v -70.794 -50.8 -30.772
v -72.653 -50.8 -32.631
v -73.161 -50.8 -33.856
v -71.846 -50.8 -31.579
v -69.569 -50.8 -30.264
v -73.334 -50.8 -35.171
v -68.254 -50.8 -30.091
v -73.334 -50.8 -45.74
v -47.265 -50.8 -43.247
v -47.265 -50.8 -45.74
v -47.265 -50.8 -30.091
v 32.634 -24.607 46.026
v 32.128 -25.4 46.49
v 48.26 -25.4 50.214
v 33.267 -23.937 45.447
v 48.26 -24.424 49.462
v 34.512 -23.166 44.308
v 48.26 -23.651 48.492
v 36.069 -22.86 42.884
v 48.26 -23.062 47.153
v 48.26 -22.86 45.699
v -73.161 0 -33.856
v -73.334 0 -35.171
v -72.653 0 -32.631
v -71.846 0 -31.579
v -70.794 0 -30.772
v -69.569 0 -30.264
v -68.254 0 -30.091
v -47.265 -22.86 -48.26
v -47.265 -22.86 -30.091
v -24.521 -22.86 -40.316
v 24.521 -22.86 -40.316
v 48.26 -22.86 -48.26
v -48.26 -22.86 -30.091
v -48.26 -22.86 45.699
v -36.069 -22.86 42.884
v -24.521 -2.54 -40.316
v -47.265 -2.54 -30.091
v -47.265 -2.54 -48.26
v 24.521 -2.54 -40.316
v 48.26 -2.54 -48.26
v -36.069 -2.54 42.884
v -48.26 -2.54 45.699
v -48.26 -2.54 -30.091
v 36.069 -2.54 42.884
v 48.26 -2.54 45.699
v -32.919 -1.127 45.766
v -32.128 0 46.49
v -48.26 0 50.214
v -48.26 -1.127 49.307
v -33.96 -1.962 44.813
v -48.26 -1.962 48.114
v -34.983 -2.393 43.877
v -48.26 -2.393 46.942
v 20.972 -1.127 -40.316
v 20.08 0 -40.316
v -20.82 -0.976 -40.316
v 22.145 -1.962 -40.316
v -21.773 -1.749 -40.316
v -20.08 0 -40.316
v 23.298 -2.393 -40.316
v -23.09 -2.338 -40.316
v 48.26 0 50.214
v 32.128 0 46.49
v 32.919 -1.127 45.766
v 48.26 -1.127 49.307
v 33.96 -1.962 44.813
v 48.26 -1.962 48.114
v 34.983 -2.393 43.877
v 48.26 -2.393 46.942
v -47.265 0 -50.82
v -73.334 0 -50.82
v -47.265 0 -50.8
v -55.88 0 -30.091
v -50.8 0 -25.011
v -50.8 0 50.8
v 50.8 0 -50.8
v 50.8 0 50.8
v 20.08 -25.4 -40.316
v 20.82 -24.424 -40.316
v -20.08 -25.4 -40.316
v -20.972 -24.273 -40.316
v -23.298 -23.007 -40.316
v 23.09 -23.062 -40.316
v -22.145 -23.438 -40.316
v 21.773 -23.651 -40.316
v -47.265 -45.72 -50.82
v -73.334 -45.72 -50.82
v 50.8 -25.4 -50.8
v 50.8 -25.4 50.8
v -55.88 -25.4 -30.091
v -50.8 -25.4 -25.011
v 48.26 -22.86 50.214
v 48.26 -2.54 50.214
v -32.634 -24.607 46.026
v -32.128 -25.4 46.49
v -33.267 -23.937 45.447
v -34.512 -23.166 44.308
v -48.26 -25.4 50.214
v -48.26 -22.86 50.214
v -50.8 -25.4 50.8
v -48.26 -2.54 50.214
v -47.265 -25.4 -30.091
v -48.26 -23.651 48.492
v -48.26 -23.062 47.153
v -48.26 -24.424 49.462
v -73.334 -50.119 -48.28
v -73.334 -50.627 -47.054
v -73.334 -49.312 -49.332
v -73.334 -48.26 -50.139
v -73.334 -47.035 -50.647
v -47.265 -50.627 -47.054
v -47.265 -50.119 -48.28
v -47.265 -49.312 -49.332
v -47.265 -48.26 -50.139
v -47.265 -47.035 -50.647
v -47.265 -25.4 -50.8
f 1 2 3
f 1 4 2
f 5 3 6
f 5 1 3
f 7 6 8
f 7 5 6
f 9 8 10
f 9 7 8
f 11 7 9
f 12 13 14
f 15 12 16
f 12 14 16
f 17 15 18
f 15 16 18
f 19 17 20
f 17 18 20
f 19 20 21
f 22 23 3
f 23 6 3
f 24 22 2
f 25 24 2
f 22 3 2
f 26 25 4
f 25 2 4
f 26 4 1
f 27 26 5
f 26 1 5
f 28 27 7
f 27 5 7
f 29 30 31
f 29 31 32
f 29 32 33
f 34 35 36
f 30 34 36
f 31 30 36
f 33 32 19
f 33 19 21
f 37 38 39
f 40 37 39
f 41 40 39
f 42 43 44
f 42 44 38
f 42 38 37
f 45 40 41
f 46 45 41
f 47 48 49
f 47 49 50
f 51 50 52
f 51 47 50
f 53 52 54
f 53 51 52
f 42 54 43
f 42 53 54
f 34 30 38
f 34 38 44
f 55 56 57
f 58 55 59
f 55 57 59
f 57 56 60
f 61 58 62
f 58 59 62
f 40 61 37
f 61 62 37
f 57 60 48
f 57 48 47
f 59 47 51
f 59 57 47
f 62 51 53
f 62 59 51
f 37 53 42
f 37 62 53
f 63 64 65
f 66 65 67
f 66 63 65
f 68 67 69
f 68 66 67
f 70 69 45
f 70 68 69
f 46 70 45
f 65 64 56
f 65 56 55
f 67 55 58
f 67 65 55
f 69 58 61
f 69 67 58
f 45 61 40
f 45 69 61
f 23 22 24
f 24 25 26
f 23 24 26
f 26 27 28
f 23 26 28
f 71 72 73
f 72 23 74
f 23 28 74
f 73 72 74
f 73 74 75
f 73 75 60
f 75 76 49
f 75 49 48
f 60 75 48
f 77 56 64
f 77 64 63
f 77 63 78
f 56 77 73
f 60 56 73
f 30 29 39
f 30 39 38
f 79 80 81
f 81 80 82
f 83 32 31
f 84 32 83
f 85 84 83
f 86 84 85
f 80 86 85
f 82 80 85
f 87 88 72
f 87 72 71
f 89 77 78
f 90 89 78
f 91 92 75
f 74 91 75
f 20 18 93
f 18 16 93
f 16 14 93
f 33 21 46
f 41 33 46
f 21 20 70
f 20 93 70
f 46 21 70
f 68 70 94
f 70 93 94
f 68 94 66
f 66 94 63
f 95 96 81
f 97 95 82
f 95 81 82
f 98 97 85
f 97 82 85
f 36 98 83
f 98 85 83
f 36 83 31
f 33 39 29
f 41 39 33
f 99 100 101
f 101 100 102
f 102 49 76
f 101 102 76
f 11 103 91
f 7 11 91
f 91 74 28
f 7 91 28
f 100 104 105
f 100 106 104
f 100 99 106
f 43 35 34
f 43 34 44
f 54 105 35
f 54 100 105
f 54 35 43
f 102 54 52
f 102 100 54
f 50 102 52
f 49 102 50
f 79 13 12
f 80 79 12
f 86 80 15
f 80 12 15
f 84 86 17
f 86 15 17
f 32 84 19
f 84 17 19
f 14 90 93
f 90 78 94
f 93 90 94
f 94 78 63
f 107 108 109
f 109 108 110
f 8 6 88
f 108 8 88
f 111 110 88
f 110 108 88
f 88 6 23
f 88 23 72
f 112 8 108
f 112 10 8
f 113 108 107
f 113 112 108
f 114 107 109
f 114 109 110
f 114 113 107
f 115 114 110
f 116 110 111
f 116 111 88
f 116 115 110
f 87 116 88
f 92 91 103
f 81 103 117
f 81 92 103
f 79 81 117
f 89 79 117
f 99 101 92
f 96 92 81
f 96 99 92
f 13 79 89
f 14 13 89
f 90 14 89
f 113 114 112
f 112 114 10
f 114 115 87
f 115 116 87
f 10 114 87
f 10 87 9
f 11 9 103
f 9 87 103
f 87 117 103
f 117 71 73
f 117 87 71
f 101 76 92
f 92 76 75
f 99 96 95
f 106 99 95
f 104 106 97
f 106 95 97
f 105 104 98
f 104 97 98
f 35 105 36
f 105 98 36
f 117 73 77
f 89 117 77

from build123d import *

# Parameters (mm, degrees)
F1_DEPTH     = 25.4
F2_T         = -2.54
F3_T4_DEPTH  = 109.6353324848
F3_T9_DEPTH  = 109.6353324848
F3_T14_DEPTH = 38.5537016023
F3_T19_DEPTH = 38.5537016023
F3_T24_DEPTH = 109.6353324848
F3_T29_DEPTH = 38.5537016023
F3_T34_DEPTH = 109.6353324848
F3_T39_DEPTH = 38.5537016023
F4_W         = 7.5721852481
F4_H         = 7.5721852481
F5_DEPTH     = 50.8
F6_SIZE      = 5.08
F7_R         = 5.08


# Not quite as in the source:
# - a fillet or chamfer that OpenCascade refuses, or shapes differently, is made with other operations: its cross-section is extruded or revolved along the edge and cut away or added


with BuildPart() as f1:
    # F0 (on Front) → F1 (new body)
    with BuildSketch(Plane.XZ):
        Polygon((-50.8, -50.8), (50.8, -50.8), (50.8, 50.8), (32.1275666356, 46.4897789061), (20.0797300786, -40.3164364398), (-20.0797300786, -40.3164364398), (-32.1275666356, 46.4897789061), (-50.8, 50.8), align=None)
    extrude(amount=F1_DEPTH)

    # F2
    f2_openings = [f1.faces().sort_by_distance(p)[0] for p in [
        (-41.463783, -12.7, 48.644889),
        (-26.103648, -12.7, 3.086671),
        (0, -12.7, -40.316436),
        (41.463783, -12.7, 48.644889),
        (26.103648, -12.7, 3.086671),
    ]]
    offset(amount=F2_T, openings=f2_openings)

    # F3: fillet of radius 5.08 on 8 edges, made by hand


with BuildPart() as f3_tool2:
    # F3_s3 → F3_t4 (new body)
    with BuildSketch(Plane(origin=(8.4495366949, 0, 60.8800010222), x_dir=(0, 1, 0), z_dir=(-0.1374722959, 0, -0.9905056122))):
        with BuildLine():
            ThreePointArc((0, 25.4314784161), (-1.8594090512, 27.2908874673), (-2.54, 29.8308874673))
            Line((-2.54, 29.8308874673), (-2.54, 25.4314784161))
            Line((-2.54, 25.4314784161), (0, 25.4314784161))
        make_face()
    extrude(amount=F3_T4_DEPTH)

    split(bisect_by=Plane.XY.offset(-40.3164364398), keep=Keep.TOP)


with BuildPart() as f1_1:
    add(f1.part)

    # F3_t1: cut F3_tool2
    add(f3_tool2.part, mode=Mode.SUBTRACT)


with BuildPart() as f3_tool7:
    # F3_s8 → F3_t9 (new body)
    with BuildSketch(Plane(origin=(6.6222841773, 0, -47.7144111022), x_dir=(0, 1, 0), z_dir=(-0.1374722959, 0, 0.9905056122))):
        with BuildLine():
            ThreePointArc((0, 25.4314784161), (-1.8594090512, 27.2908874673), (-2.54, 29.8308874673))
            Line((-2.54, 29.8308874673), (-2.54, 25.4314784161))
            Line((-2.54, 25.4314784161), (0, 25.4314784161))
        make_face()
    extrude(amount=F3_T9_DEPTH)

    split(bisect_by=Plane.XY.offset(-40.3164364398), keep=Keep.TOP)


with BuildPart() as f1_2:
    add(f1_1.part)

    # F3_t6: cut F3_tool7
    add(f3_tool7.part, mode=Mode.SUBTRACT)


with BuildPart() as f3_tool12:
    # F3_s13 → F3_t14 (new body)
    with BuildSketch(Plane(origin=(67.5399359806, 0, 15.5904723858), x_dir=(0, 1, 0), z_dir=(-0.9743774967, 0, -0.2249188607))):
        with BuildLine():
            ThreePointArc((0, -38.0724987065), (-1.8594090512, -36.2130896553), (-2.54, -33.6730896553))
            Line((-2.54, -33.6730896553), (-2.54, -38.0724987065))
            Line((-2.54, -38.0724987065), (0, -38.0724987065))
        make_face()
    extrude(amount=F3_T14_DEPTH)

    split(bisect_by=Plane.YZ.offset(48.26), keep=Keep.BOTTOM)


with BuildPart() as f1_3:
    add(f1_2.part)

    # F3_t11: cut F3_tool12
    add(f3_tool12.part, mode=Mode.SUBTRACT)


with BuildPart() as f3_tool17:
    # F3_s18 → F3_t19 (new body)
    with BuildSketch(Plane(origin=(-29.9740767247, 0, 6.9190177438), x_dir=(0, 1, 0), z_dir=(-0.9743774967, 0, 0.2249188607))):
        with BuildLine():
            ThreePointArc((0, -38.0724987065), (-1.8594090512, -36.2130896553), (-2.54, -33.6730896553))
            Line((-2.54, -33.6730896553), (-2.54, -38.0724987065))
            Line((-2.54, -38.0724987065), (0, -38.0724987065))
        make_face()
    extrude(amount=F3_T19_DEPTH)

    split(bisect_by=Plane.YZ.offset(-48.26), keep=Keep.TOP)


with BuildPart() as f1_4:
    add(f1_3.part)

    # F3_t16: cut F3_tool17
    add(f3_tool17.part, mode=Mode.SUBTRACT)


with BuildPart() as f3_tool22:
    # F3_s23 → F3_t24 (new body)
    with BuildSketch(Plane(origin=(6.6222841773, 0, -47.7144111022), x_dir=(0, 1, 0), z_dir=(-0.1374722959, 0, 0.9905056122))):
        with BuildLine():
            ThreePointArc((-25.4, 25.4314784161), (-23.5405909488, 27.2908874673), (-22.86, 29.8308874673))
            Line((-22.86, 29.8308874673), (-22.86, 25.4314784161))
            Line((-22.86, 25.4314784161), (-25.4, 25.4314784161))
        make_face()
    extrude(amount=F3_T24_DEPTH)

    split(bisect_by=Plane.XY.offset(-40.3164364398), keep=Keep.TOP)


with BuildPart() as f1_5:
    add(f1_4.part)

    # F3_t21: cut F3_tool22
    add(f3_tool22.part, mode=Mode.SUBTRACT)


with BuildPart() as f3_tool27:
    # F3_s28 → F3_t29 (new body)
    with BuildSketch(Plane(origin=(-29.9740767247, 0, 6.9190177438), x_dir=(0, 1, 0), z_dir=(-0.9743774967, 0, 0.2249188607))):
        with BuildLine():
            ThreePointArc((-25.4, -38.0724987065), (-23.5405909488, -36.2130896553), (-22.86, -33.6730896553))
            Line((-22.86, -33.6730896553), (-22.86, -38.0724987065))
            Line((-22.86, -38.0724987065), (-25.4, -38.0724987065))
        make_face()
    extrude(amount=F3_T29_DEPTH)

    split(bisect_by=Plane.YZ.offset(-48.26), keep=Keep.TOP)


with BuildPart() as f1_6:
    add(f1_5.part)

    # F3_t26: cut F3_tool27
    add(f3_tool27.part, mode=Mode.SUBTRACT)


with BuildPart() as f3_tool32:
    # F3_s33 → F3_t34 (new body)
    with BuildSketch(Plane(origin=(8.4495366949, 0, 60.8800010222), x_dir=(0, 1, 0), z_dir=(-0.1374722959, 0, -0.9905056122))):
        with BuildLine():
            ThreePointArc((-25.4, 25.4314784161), (-23.5405909488, 27.2908874673), (-22.86, 29.8308874673))
            Line((-22.86, 29.8308874673), (-22.86, 25.4314784161))
            Line((-22.86, 25.4314784161), (-25.4, 25.4314784161))
        make_face()
    extrude(amount=F3_T34_DEPTH)

    split(bisect_by=Plane.XY.offset(-40.3164364398), keep=Keep.TOP)


with BuildPart() as f1_7:
    add(f1_6.part)

    # F3_t31: cut F3_tool32
    add(f3_tool32.part, mode=Mode.SUBTRACT)


with BuildPart() as f3_tool37:
    # F3_s38 → F3_t39 (new body)
    with BuildSketch(Plane(origin=(67.5399359806, 0, 15.5904723858), x_dir=(0, 1, 0), z_dir=(-0.9743774967, 0, -0.2249188607))):
        with BuildLine():
            ThreePointArc((-25.4, -38.0724987065), (-23.5405909488, -36.2130896553), (-22.86, -33.6730896553))
            Line((-22.86, -33.6730896553), (-22.86, -38.0724987065))
            Line((-22.86, -38.0724987065), (-25.4, -38.0724987065))
        make_face()
    extrude(amount=F3_T39_DEPTH)

    split(bisect_by=Plane.YZ.offset(48.26), keep=Keep.BOTTOM)


with BuildPart() as f1_8:
    add(f1_7.part)

    # F3_t36: cut F3_tool37
    add(f3_tool37.part, mode=Mode.SUBTRACT)

    # F4 (on Front) → F5 (join)
    with BuildSketch(Plane.XZ):
        Polygon((-73.3337104321, -50.8196800947), (-54.8367798328, -50.8196800947), (-54.8367798328, -43.2474948466), (-47.2645945847, -43.2474948466), (-47.2645945847, -30.0912298262), (-73.3337104321, -30.0912298262), align=None)
        with Locations((-51.0506872088, -47.0335874707)):
            Rectangle(F4_W, F4_H)
    extrude(amount=F5_DEPTH)

    # F6
    f6_edges = [f1_8.edges().sort_by_distance(p)[0] for p in [
        (-50.8, -12.7, -30.09123),
    ]]
    chamfer(f6_edges, length=F6_SIZE)

    # F7
    f7_edges = [f1_8.edges().sort_by_distance(p)[0] for p in [
        (-73.33371, -25.4, -30.09123),
        (-60.299153, -50.8, -50.81968),
    ]]
    fillet(f7_edges, radius=F7_R)


solid = f1_8.part
